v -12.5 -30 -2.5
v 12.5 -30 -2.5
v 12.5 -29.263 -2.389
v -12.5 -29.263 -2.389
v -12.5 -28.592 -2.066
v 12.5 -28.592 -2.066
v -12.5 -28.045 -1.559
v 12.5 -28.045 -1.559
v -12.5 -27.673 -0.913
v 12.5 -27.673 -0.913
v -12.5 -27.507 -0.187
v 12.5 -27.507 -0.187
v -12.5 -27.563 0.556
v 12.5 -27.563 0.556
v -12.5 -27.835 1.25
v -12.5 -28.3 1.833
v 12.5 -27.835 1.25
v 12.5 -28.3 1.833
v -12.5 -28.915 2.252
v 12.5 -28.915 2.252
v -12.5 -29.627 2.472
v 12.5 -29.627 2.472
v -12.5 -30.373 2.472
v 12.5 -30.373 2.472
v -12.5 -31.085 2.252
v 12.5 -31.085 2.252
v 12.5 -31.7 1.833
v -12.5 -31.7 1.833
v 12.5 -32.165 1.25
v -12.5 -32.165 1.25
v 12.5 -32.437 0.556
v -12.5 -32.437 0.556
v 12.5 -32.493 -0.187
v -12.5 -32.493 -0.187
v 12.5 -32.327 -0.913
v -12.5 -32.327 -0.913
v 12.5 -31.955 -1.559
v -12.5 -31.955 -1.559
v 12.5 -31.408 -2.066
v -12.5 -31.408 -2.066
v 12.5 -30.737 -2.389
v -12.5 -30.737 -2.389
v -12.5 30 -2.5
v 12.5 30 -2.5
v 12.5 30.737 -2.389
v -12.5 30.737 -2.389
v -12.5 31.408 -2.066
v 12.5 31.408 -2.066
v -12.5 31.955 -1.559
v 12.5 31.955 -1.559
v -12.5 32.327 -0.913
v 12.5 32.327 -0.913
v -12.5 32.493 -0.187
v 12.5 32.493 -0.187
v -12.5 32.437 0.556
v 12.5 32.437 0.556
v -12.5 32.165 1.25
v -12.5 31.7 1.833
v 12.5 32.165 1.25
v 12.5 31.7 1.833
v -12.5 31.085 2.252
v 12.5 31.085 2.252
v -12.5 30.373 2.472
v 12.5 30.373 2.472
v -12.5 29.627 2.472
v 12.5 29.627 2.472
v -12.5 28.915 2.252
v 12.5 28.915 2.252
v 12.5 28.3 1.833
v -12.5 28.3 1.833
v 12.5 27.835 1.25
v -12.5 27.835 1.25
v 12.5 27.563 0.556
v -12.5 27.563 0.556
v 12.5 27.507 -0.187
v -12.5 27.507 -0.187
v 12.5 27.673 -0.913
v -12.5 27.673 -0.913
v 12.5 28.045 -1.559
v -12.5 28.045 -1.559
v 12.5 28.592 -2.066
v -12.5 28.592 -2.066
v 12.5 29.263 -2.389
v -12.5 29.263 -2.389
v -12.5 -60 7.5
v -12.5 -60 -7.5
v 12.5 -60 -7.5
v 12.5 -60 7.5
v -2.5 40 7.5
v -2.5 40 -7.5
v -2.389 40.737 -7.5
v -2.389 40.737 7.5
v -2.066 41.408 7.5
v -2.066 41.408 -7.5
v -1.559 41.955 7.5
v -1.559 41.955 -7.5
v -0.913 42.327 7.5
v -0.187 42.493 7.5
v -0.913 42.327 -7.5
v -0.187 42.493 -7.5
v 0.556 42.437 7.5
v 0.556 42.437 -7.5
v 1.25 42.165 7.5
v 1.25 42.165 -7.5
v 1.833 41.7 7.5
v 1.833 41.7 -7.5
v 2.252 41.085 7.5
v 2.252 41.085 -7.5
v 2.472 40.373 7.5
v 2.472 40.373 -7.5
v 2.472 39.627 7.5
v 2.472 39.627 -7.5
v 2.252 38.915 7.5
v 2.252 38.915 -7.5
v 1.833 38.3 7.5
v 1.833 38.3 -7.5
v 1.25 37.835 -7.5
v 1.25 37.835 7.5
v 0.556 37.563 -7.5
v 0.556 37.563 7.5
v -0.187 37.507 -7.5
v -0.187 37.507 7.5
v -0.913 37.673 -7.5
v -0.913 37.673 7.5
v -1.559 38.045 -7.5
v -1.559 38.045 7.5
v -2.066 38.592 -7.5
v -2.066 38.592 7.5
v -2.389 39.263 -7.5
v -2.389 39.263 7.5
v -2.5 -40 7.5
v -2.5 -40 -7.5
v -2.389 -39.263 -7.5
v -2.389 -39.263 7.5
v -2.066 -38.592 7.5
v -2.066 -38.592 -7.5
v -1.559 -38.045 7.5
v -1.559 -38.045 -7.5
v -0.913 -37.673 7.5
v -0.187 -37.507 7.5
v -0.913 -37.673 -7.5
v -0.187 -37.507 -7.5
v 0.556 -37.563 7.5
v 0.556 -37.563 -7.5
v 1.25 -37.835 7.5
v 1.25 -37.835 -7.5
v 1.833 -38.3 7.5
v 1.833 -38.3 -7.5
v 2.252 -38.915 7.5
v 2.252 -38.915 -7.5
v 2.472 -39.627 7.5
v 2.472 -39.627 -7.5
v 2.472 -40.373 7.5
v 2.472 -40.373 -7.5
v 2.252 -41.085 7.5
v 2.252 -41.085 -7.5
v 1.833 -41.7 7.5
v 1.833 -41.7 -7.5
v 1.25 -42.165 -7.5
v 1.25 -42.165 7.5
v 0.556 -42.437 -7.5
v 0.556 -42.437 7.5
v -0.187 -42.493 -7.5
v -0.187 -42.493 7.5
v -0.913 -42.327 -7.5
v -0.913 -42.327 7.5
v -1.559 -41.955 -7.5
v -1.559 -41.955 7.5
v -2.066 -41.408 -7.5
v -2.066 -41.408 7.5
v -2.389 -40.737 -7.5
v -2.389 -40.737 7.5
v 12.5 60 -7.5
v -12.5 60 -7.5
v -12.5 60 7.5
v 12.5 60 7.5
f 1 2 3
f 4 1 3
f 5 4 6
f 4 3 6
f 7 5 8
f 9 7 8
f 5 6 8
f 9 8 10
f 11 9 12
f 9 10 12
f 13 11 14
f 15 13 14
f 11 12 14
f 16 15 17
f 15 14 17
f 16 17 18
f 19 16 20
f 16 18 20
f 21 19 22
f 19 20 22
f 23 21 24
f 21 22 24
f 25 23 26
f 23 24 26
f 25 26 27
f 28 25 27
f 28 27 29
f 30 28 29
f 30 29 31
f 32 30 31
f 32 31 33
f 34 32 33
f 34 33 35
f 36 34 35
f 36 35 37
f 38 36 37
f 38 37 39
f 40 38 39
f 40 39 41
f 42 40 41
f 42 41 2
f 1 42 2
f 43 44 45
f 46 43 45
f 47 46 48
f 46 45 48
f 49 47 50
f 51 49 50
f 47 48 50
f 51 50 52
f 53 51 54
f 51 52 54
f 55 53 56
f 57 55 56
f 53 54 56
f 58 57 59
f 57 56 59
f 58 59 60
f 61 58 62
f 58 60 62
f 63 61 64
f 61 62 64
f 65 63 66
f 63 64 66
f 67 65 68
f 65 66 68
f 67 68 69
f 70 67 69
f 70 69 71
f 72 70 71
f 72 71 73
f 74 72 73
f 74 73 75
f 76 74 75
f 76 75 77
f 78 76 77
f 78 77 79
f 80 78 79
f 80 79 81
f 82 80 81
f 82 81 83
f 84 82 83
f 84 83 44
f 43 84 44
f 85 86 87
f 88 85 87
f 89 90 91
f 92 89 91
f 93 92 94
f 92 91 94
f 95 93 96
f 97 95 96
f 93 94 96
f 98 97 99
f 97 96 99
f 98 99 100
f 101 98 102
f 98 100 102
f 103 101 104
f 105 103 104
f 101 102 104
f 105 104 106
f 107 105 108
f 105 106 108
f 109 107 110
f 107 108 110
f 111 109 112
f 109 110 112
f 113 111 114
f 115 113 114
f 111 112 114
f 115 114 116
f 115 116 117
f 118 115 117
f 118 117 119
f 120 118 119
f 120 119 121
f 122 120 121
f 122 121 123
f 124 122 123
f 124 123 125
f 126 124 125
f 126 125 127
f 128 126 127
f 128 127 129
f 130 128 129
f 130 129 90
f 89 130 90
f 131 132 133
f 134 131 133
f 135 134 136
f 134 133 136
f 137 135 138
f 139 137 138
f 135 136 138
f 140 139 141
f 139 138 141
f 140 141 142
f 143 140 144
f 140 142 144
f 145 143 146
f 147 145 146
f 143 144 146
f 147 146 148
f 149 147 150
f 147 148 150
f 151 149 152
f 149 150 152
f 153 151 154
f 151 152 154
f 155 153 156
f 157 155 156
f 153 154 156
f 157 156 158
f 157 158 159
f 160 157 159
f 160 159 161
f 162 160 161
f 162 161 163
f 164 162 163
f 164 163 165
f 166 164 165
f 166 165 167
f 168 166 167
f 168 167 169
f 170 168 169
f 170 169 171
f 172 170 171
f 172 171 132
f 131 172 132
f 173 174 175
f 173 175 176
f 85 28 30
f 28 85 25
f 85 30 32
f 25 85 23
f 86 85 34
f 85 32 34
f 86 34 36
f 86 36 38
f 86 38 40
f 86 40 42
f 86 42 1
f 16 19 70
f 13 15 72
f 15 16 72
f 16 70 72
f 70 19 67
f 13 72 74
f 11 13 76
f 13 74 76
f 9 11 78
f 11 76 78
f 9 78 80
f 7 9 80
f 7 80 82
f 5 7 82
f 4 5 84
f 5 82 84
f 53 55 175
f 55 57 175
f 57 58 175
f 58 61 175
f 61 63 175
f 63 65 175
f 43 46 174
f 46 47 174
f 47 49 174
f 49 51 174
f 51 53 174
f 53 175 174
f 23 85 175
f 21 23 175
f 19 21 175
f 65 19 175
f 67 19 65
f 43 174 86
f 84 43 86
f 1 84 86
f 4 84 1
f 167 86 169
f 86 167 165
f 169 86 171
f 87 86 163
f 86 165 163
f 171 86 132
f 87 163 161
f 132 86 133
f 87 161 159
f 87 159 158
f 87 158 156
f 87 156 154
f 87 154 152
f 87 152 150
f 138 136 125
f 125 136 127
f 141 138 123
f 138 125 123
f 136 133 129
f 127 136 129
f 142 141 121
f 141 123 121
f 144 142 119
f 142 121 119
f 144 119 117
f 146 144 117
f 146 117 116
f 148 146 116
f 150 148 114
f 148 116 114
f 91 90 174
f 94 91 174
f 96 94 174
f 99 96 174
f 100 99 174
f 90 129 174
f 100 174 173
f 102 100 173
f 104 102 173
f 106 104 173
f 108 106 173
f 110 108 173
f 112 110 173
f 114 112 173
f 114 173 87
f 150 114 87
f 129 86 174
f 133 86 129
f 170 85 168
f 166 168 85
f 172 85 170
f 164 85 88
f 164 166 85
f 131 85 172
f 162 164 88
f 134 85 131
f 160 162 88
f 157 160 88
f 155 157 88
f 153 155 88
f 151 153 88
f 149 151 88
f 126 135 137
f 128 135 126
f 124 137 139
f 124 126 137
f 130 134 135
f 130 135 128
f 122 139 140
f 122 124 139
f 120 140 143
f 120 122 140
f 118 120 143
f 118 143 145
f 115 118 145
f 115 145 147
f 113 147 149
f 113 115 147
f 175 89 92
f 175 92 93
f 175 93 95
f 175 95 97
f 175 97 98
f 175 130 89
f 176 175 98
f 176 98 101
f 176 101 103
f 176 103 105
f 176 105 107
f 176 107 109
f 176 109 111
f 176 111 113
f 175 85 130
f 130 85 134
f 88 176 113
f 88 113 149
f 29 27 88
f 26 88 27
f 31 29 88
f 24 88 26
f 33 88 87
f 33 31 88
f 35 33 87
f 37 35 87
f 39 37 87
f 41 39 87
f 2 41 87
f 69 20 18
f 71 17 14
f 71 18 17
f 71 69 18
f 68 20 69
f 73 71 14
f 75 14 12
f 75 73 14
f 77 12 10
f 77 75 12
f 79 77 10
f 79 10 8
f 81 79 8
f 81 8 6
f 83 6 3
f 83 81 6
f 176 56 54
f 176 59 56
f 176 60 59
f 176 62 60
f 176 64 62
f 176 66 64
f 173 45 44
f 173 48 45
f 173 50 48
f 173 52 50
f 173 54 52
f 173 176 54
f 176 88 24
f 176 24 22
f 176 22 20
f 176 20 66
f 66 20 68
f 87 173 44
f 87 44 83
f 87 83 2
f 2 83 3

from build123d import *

# Parameters (mm, degrees)
SKETCH1_W           = 25
SKETCH1_H           = 15
BOSS_EXTRUDE1_DEPTH = 60
M6_TAPPED_HOLE1_D   = 5
M6_TAPPED_HOLE2_D   = 5


with BuildPart() as part:
    # Sketch1 → Boss-Extrude1 (new body, symmetric)
    with BuildSketch(Plane(origin=(0, 0, 0), x_dir=(1, 0, 0), z_dir=(0, 1, 0))):
        Rectangle(SKETCH1_W, SKETCH1_H)
    extrude(amount=BOSS_EXTRUDE1_DEPTH, both=True)

    # M6 Tapped Hole1 (through all)
    with Locations(Plane.ZY.offset(12.5)):
        with Locations((0, 30), (0, -30)):
            Hole(M6_TAPPED_HOLE1_D / 2)

    # M6 Tapped Hole2 (through all)
    with Locations(Plane.XY.offset(7.5)):
        with Locations((0, 40), (0, -40)):
            Hole(M6_TAPPED_HOLE2_D / 2)


solid = part.part
